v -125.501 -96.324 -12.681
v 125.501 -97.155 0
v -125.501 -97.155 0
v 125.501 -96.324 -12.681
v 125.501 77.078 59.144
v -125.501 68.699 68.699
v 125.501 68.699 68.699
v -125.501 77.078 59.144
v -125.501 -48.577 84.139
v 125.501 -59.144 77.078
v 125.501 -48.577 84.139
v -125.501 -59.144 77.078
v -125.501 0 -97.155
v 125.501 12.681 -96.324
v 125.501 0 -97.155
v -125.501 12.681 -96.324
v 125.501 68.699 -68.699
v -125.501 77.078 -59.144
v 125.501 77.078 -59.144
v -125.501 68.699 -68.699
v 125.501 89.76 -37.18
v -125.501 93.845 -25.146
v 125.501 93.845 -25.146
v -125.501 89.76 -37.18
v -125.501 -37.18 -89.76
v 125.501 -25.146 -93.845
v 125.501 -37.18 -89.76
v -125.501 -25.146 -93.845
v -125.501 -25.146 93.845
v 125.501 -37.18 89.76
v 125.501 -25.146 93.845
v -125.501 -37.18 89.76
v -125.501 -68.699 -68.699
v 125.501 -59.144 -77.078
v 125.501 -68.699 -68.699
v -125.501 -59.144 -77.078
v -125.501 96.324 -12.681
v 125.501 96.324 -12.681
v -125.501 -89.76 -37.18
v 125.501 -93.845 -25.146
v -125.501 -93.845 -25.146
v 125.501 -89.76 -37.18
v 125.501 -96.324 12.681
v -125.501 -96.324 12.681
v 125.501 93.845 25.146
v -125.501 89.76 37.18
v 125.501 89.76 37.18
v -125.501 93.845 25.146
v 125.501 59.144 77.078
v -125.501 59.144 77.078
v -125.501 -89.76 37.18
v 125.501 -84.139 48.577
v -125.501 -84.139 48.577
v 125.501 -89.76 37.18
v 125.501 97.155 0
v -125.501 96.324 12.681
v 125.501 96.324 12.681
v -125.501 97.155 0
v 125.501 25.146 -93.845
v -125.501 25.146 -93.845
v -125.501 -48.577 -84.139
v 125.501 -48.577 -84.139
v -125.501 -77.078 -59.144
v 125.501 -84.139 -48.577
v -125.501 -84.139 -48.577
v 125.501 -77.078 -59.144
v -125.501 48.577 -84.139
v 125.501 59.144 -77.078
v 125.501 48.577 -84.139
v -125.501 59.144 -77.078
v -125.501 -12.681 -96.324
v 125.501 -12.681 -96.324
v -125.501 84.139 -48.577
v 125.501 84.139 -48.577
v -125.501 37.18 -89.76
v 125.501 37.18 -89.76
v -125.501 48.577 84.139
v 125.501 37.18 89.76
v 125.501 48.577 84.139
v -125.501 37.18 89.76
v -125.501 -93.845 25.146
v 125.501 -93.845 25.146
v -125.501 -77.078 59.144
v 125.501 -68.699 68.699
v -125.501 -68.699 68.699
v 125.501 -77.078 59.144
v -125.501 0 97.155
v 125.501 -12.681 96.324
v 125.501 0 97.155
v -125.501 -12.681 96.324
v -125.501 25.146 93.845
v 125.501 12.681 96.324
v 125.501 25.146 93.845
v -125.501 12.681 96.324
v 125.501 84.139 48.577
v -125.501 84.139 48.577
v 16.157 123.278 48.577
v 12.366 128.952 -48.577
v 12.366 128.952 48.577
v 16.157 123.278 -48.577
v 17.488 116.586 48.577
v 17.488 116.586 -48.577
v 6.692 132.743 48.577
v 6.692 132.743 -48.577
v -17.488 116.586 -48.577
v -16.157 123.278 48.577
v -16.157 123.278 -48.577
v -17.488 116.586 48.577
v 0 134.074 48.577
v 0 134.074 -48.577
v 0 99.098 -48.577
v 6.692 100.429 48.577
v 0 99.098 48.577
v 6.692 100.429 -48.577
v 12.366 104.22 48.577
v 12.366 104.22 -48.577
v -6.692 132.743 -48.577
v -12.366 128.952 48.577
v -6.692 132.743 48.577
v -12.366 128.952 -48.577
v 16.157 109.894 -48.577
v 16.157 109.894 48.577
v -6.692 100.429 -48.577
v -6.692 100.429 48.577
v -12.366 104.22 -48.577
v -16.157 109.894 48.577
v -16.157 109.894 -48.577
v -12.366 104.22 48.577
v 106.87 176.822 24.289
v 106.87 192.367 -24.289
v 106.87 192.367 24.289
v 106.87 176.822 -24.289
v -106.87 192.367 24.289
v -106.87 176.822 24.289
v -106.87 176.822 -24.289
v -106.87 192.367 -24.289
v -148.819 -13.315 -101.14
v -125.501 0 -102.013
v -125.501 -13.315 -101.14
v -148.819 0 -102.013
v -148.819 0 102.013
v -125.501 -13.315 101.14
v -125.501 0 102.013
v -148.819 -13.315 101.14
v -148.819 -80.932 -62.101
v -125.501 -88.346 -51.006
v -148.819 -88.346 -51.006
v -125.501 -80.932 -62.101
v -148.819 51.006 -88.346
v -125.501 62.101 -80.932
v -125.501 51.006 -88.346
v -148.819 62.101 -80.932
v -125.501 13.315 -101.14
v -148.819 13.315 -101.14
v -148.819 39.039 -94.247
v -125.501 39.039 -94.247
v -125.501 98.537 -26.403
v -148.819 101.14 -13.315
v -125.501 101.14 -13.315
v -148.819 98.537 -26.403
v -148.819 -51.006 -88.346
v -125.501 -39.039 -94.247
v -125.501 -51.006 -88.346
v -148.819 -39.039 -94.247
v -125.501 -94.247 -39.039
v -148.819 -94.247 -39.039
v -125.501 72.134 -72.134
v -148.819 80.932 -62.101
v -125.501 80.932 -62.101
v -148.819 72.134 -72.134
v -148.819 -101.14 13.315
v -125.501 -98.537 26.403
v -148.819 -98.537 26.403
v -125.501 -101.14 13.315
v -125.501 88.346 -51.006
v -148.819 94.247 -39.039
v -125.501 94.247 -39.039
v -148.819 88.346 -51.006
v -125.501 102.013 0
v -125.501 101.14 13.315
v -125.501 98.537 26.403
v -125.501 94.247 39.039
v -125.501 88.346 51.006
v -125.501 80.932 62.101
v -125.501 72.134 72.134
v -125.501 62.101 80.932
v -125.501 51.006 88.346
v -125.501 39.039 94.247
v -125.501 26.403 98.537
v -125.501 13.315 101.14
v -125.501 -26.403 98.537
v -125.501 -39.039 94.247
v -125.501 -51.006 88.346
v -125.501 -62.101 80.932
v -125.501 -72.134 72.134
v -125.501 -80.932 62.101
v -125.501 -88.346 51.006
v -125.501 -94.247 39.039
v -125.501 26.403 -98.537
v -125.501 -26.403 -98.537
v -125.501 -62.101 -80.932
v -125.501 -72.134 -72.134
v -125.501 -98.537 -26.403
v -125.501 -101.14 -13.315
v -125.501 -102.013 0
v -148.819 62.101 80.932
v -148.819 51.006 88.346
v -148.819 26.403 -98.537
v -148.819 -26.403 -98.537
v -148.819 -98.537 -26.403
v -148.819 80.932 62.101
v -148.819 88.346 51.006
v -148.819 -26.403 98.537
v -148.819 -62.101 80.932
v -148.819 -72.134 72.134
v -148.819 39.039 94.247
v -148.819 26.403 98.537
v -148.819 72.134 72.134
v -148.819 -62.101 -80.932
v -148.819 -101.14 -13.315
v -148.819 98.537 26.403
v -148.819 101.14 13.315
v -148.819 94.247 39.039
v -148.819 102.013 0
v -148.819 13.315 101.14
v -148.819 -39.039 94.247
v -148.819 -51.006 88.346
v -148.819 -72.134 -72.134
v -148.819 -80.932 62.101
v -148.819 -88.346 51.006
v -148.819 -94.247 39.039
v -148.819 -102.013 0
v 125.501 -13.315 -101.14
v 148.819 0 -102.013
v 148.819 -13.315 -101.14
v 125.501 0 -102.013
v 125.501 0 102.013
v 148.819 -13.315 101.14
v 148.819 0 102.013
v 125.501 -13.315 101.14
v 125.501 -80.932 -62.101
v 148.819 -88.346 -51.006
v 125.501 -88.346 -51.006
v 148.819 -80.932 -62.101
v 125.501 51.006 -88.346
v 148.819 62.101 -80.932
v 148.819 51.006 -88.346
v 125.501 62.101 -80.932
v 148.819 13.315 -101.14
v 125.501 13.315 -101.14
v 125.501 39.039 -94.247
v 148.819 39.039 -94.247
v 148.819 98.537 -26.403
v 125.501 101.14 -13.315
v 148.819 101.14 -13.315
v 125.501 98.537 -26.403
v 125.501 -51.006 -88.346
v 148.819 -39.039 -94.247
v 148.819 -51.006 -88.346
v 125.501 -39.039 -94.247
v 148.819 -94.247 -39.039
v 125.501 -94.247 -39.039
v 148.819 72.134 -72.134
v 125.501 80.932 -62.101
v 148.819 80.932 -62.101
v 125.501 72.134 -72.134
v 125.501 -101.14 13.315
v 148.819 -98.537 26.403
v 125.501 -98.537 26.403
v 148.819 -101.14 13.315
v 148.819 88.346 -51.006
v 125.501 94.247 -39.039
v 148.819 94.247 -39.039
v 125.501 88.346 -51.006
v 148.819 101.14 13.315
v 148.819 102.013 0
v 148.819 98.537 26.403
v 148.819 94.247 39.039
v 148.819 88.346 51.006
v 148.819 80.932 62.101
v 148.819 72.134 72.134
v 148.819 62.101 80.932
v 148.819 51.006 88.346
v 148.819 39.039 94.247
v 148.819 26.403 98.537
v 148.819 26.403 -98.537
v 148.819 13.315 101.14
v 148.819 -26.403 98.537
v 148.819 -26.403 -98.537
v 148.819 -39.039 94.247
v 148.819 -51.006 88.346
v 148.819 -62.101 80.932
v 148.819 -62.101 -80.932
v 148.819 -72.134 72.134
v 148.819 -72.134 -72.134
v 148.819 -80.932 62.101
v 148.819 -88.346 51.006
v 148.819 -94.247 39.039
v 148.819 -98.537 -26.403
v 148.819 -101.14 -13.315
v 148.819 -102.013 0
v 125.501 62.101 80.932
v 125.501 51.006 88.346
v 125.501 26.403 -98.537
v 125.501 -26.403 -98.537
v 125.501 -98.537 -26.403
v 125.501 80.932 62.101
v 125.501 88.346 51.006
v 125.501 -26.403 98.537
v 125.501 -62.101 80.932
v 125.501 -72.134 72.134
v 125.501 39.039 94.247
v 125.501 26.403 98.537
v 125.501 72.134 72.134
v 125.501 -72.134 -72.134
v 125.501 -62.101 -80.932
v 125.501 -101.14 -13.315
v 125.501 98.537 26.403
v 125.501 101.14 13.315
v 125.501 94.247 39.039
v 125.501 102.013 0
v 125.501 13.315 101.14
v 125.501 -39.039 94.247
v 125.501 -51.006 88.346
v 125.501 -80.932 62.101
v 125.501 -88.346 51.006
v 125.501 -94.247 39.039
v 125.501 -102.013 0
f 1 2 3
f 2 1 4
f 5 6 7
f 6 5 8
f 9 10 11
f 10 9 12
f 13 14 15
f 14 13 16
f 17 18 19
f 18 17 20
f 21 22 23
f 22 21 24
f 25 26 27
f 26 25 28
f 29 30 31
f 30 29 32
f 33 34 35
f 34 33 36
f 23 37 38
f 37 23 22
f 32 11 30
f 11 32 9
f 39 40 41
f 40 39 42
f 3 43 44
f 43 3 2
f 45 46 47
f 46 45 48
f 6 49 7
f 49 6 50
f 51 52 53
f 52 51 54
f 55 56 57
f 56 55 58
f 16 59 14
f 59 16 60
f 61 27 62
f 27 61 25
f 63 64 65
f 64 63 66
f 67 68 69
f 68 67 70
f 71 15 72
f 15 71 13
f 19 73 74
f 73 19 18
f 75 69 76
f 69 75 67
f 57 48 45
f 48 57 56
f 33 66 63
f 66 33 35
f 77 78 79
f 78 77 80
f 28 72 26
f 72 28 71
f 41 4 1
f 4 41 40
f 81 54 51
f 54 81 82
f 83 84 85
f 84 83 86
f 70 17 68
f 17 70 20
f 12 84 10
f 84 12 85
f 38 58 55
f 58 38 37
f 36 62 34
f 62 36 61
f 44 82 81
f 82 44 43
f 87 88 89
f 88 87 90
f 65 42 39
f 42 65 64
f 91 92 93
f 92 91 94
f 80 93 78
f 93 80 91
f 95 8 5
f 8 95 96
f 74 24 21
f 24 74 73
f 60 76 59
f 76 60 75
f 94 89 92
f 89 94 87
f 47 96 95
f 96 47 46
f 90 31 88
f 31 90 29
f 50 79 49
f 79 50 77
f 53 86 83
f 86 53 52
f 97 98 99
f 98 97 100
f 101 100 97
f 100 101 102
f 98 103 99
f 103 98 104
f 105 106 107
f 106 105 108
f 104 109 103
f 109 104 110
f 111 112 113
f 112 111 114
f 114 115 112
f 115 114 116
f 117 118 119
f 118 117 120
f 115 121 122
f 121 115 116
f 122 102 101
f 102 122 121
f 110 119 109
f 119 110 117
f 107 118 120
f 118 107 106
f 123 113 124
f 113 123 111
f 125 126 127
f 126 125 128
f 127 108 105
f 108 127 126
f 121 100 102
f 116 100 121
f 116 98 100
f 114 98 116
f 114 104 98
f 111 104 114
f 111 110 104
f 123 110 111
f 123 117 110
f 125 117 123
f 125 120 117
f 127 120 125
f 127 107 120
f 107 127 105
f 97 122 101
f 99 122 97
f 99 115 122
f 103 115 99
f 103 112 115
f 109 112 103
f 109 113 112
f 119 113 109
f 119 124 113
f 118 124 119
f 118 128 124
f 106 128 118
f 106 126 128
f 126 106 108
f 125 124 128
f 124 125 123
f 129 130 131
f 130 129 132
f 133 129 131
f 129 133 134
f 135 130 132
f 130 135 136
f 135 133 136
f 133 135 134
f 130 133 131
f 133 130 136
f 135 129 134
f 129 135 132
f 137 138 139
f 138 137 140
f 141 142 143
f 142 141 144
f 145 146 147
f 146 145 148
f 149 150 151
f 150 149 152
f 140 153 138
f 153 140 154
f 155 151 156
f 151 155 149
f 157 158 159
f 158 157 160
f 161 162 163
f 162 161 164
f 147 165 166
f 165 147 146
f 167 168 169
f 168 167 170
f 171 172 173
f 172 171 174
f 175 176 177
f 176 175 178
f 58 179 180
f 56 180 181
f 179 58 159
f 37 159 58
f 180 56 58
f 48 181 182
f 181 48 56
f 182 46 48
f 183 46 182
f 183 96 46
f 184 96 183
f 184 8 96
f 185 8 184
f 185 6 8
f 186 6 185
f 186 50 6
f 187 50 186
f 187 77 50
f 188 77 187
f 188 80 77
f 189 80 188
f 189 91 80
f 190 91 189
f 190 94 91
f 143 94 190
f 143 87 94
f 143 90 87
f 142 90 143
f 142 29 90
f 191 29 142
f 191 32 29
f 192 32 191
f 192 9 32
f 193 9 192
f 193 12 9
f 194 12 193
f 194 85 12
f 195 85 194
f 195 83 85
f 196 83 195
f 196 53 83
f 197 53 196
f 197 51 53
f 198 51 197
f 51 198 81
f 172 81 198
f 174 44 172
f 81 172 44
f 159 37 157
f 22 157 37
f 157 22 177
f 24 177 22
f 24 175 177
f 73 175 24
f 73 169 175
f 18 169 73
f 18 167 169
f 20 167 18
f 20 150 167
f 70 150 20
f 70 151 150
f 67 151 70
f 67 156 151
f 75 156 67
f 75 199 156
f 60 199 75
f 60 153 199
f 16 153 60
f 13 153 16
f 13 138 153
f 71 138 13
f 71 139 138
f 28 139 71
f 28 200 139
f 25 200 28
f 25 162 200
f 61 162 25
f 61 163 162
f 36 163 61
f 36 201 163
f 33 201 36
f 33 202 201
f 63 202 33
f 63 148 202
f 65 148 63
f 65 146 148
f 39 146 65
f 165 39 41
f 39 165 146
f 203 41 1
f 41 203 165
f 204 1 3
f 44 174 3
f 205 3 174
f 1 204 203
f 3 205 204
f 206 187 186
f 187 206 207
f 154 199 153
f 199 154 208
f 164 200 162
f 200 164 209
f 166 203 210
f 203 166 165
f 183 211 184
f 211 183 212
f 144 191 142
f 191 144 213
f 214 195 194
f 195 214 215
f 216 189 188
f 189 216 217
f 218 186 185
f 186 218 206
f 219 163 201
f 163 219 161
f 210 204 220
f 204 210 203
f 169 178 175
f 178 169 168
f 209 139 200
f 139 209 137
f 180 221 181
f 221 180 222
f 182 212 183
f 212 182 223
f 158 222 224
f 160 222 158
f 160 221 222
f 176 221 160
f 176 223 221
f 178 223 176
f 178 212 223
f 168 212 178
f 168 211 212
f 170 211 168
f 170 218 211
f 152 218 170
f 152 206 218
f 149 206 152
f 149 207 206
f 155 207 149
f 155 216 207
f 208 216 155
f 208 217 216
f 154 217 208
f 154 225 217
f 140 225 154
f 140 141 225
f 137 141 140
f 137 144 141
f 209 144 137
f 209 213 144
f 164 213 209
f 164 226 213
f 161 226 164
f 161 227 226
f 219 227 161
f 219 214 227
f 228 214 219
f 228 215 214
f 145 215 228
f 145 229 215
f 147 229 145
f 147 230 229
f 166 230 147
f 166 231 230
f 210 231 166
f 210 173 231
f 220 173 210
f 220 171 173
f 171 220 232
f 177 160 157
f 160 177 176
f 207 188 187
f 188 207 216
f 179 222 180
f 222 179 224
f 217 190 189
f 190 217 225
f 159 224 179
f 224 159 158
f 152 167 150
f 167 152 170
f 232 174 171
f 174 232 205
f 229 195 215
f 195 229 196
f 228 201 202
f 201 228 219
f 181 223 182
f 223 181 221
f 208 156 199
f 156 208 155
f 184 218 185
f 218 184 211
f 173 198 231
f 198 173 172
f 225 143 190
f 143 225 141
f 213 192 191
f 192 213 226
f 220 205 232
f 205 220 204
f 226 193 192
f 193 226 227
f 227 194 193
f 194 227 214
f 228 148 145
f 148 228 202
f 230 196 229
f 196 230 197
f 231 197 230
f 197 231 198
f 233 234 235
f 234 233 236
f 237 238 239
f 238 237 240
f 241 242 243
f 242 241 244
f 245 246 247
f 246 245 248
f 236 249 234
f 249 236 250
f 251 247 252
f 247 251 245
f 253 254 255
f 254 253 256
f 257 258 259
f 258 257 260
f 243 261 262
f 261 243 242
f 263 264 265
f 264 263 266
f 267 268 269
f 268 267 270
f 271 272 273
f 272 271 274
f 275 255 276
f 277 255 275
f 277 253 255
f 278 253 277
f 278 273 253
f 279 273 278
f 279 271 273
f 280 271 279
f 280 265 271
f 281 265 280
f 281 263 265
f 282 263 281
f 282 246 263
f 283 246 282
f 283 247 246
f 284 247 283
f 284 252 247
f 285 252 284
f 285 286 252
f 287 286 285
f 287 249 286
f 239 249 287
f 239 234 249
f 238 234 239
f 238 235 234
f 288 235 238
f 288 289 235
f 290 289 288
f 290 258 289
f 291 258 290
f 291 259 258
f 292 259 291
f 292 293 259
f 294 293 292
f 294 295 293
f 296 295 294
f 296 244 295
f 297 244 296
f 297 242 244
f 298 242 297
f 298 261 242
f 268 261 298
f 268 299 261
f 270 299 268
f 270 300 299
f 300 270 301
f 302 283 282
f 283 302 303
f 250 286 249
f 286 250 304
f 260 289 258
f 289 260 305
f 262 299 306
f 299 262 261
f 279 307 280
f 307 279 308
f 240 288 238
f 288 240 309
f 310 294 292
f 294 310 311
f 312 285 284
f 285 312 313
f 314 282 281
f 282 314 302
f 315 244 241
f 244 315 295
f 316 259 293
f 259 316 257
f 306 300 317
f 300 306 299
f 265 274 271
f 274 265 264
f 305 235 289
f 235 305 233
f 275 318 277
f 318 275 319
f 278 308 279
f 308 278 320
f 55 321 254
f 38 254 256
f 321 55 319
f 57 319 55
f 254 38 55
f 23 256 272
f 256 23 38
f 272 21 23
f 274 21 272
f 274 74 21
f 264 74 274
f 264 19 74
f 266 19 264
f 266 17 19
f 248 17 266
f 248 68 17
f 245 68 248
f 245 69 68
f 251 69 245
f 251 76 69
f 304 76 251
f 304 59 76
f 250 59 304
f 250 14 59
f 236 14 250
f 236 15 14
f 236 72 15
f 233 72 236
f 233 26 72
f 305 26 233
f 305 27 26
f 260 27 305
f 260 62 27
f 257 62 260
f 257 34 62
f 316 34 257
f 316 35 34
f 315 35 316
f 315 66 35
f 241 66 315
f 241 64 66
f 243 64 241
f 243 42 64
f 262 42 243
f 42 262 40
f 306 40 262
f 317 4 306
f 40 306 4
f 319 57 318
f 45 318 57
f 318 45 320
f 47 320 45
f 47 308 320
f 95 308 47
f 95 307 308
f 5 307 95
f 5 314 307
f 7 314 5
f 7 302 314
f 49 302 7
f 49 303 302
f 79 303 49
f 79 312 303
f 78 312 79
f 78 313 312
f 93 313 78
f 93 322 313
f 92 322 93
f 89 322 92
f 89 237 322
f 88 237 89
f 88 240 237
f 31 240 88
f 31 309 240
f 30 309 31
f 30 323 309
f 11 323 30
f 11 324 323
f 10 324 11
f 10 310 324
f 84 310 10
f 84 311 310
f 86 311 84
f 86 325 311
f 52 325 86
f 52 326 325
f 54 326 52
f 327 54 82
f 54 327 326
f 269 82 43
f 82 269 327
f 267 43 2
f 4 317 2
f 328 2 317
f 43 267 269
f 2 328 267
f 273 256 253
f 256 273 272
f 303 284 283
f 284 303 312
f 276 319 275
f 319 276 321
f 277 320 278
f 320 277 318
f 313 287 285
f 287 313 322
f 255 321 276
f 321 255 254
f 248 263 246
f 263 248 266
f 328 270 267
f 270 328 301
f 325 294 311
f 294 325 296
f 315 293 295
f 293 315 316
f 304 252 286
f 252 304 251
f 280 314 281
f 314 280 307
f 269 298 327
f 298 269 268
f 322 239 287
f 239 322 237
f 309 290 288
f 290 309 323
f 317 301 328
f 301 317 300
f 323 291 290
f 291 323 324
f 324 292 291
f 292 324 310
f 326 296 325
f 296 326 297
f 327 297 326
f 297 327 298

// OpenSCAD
// Auto-generated by scripts/author_from_manifest.py (Phase D.3).
// Source: data/phase_d_manifest.json (sku_intent='watts-957-rpz-backflow-4in').
// Do not hand-edit — regenerate from the manifest.
//
// @part watts_957_rpz_backflow_4in
// @kind valve
// @category valve.backflow
// @display-name "Watts 957 RPZ Backflow Preventer 4\""
// @mfg watts_water
// @mfg-pn Series_957
// @listing UL FM
// @price-usd 2330.00
// @install-minutes 60
// @crew foreman
// @param size_in number default=4 label="Size" unit="in"
// @port inlet position=[-0.05,0,0] direction=[-1,0,0] style=grooved size_in=4 role=run_a
// @port outlet position=[0.05,0,0] direction=[1,0,0] style=grooved size_in=4 role=run_b

size_in = 4.0;

function od_mm(nps) =
    nps ==   1  ? 33.4 :
    nps == 1.25 ? 42.2 :
    nps == 1.5  ? 48.3 :
    nps ==   2  ? 60.3 :
    nps == 2.5  ? 73.0 :
    nps ==   3  ? 88.9 :
    nps ==   4  ? 114.3 :
    nps ==   6  ? 168.3 :
    nps ==   8  ? 219.1 : 73.0;

od = od_mm(size_in);
body_len = od * 2.4;
body_d   = od * 1.7;

union() {
    // Valve body
    rotate([0, 90, 0])
        cylinder(h = body_len, d = body_d, center = true, $fn = 48);
    // Stem / handle indicator
    translate([0, body_d * 0.6, 0])
        cylinder(h = body_d * 0.5, d = body_d * 0.18, center = true, $fn = 16);
    translate([0, body_d * 0.95, 0])
        cube([body_d * 1.1, body_d * 0.08, body_d * 0.25], center = true);
    // End flanges
    translate([-body_len/2, 0, 0])
        rotate([0, 90, 0])
        cylinder(h = body_d * 0.12, d = body_d * 1.05, center = true, $fn = 48);
    translate([ body_len/2, 0, 0])
        rotate([0, 90, 0])
        cylinder(h = body_d * 0.12, d = body_d * 1.05, center = true, $fn = 48);
}
